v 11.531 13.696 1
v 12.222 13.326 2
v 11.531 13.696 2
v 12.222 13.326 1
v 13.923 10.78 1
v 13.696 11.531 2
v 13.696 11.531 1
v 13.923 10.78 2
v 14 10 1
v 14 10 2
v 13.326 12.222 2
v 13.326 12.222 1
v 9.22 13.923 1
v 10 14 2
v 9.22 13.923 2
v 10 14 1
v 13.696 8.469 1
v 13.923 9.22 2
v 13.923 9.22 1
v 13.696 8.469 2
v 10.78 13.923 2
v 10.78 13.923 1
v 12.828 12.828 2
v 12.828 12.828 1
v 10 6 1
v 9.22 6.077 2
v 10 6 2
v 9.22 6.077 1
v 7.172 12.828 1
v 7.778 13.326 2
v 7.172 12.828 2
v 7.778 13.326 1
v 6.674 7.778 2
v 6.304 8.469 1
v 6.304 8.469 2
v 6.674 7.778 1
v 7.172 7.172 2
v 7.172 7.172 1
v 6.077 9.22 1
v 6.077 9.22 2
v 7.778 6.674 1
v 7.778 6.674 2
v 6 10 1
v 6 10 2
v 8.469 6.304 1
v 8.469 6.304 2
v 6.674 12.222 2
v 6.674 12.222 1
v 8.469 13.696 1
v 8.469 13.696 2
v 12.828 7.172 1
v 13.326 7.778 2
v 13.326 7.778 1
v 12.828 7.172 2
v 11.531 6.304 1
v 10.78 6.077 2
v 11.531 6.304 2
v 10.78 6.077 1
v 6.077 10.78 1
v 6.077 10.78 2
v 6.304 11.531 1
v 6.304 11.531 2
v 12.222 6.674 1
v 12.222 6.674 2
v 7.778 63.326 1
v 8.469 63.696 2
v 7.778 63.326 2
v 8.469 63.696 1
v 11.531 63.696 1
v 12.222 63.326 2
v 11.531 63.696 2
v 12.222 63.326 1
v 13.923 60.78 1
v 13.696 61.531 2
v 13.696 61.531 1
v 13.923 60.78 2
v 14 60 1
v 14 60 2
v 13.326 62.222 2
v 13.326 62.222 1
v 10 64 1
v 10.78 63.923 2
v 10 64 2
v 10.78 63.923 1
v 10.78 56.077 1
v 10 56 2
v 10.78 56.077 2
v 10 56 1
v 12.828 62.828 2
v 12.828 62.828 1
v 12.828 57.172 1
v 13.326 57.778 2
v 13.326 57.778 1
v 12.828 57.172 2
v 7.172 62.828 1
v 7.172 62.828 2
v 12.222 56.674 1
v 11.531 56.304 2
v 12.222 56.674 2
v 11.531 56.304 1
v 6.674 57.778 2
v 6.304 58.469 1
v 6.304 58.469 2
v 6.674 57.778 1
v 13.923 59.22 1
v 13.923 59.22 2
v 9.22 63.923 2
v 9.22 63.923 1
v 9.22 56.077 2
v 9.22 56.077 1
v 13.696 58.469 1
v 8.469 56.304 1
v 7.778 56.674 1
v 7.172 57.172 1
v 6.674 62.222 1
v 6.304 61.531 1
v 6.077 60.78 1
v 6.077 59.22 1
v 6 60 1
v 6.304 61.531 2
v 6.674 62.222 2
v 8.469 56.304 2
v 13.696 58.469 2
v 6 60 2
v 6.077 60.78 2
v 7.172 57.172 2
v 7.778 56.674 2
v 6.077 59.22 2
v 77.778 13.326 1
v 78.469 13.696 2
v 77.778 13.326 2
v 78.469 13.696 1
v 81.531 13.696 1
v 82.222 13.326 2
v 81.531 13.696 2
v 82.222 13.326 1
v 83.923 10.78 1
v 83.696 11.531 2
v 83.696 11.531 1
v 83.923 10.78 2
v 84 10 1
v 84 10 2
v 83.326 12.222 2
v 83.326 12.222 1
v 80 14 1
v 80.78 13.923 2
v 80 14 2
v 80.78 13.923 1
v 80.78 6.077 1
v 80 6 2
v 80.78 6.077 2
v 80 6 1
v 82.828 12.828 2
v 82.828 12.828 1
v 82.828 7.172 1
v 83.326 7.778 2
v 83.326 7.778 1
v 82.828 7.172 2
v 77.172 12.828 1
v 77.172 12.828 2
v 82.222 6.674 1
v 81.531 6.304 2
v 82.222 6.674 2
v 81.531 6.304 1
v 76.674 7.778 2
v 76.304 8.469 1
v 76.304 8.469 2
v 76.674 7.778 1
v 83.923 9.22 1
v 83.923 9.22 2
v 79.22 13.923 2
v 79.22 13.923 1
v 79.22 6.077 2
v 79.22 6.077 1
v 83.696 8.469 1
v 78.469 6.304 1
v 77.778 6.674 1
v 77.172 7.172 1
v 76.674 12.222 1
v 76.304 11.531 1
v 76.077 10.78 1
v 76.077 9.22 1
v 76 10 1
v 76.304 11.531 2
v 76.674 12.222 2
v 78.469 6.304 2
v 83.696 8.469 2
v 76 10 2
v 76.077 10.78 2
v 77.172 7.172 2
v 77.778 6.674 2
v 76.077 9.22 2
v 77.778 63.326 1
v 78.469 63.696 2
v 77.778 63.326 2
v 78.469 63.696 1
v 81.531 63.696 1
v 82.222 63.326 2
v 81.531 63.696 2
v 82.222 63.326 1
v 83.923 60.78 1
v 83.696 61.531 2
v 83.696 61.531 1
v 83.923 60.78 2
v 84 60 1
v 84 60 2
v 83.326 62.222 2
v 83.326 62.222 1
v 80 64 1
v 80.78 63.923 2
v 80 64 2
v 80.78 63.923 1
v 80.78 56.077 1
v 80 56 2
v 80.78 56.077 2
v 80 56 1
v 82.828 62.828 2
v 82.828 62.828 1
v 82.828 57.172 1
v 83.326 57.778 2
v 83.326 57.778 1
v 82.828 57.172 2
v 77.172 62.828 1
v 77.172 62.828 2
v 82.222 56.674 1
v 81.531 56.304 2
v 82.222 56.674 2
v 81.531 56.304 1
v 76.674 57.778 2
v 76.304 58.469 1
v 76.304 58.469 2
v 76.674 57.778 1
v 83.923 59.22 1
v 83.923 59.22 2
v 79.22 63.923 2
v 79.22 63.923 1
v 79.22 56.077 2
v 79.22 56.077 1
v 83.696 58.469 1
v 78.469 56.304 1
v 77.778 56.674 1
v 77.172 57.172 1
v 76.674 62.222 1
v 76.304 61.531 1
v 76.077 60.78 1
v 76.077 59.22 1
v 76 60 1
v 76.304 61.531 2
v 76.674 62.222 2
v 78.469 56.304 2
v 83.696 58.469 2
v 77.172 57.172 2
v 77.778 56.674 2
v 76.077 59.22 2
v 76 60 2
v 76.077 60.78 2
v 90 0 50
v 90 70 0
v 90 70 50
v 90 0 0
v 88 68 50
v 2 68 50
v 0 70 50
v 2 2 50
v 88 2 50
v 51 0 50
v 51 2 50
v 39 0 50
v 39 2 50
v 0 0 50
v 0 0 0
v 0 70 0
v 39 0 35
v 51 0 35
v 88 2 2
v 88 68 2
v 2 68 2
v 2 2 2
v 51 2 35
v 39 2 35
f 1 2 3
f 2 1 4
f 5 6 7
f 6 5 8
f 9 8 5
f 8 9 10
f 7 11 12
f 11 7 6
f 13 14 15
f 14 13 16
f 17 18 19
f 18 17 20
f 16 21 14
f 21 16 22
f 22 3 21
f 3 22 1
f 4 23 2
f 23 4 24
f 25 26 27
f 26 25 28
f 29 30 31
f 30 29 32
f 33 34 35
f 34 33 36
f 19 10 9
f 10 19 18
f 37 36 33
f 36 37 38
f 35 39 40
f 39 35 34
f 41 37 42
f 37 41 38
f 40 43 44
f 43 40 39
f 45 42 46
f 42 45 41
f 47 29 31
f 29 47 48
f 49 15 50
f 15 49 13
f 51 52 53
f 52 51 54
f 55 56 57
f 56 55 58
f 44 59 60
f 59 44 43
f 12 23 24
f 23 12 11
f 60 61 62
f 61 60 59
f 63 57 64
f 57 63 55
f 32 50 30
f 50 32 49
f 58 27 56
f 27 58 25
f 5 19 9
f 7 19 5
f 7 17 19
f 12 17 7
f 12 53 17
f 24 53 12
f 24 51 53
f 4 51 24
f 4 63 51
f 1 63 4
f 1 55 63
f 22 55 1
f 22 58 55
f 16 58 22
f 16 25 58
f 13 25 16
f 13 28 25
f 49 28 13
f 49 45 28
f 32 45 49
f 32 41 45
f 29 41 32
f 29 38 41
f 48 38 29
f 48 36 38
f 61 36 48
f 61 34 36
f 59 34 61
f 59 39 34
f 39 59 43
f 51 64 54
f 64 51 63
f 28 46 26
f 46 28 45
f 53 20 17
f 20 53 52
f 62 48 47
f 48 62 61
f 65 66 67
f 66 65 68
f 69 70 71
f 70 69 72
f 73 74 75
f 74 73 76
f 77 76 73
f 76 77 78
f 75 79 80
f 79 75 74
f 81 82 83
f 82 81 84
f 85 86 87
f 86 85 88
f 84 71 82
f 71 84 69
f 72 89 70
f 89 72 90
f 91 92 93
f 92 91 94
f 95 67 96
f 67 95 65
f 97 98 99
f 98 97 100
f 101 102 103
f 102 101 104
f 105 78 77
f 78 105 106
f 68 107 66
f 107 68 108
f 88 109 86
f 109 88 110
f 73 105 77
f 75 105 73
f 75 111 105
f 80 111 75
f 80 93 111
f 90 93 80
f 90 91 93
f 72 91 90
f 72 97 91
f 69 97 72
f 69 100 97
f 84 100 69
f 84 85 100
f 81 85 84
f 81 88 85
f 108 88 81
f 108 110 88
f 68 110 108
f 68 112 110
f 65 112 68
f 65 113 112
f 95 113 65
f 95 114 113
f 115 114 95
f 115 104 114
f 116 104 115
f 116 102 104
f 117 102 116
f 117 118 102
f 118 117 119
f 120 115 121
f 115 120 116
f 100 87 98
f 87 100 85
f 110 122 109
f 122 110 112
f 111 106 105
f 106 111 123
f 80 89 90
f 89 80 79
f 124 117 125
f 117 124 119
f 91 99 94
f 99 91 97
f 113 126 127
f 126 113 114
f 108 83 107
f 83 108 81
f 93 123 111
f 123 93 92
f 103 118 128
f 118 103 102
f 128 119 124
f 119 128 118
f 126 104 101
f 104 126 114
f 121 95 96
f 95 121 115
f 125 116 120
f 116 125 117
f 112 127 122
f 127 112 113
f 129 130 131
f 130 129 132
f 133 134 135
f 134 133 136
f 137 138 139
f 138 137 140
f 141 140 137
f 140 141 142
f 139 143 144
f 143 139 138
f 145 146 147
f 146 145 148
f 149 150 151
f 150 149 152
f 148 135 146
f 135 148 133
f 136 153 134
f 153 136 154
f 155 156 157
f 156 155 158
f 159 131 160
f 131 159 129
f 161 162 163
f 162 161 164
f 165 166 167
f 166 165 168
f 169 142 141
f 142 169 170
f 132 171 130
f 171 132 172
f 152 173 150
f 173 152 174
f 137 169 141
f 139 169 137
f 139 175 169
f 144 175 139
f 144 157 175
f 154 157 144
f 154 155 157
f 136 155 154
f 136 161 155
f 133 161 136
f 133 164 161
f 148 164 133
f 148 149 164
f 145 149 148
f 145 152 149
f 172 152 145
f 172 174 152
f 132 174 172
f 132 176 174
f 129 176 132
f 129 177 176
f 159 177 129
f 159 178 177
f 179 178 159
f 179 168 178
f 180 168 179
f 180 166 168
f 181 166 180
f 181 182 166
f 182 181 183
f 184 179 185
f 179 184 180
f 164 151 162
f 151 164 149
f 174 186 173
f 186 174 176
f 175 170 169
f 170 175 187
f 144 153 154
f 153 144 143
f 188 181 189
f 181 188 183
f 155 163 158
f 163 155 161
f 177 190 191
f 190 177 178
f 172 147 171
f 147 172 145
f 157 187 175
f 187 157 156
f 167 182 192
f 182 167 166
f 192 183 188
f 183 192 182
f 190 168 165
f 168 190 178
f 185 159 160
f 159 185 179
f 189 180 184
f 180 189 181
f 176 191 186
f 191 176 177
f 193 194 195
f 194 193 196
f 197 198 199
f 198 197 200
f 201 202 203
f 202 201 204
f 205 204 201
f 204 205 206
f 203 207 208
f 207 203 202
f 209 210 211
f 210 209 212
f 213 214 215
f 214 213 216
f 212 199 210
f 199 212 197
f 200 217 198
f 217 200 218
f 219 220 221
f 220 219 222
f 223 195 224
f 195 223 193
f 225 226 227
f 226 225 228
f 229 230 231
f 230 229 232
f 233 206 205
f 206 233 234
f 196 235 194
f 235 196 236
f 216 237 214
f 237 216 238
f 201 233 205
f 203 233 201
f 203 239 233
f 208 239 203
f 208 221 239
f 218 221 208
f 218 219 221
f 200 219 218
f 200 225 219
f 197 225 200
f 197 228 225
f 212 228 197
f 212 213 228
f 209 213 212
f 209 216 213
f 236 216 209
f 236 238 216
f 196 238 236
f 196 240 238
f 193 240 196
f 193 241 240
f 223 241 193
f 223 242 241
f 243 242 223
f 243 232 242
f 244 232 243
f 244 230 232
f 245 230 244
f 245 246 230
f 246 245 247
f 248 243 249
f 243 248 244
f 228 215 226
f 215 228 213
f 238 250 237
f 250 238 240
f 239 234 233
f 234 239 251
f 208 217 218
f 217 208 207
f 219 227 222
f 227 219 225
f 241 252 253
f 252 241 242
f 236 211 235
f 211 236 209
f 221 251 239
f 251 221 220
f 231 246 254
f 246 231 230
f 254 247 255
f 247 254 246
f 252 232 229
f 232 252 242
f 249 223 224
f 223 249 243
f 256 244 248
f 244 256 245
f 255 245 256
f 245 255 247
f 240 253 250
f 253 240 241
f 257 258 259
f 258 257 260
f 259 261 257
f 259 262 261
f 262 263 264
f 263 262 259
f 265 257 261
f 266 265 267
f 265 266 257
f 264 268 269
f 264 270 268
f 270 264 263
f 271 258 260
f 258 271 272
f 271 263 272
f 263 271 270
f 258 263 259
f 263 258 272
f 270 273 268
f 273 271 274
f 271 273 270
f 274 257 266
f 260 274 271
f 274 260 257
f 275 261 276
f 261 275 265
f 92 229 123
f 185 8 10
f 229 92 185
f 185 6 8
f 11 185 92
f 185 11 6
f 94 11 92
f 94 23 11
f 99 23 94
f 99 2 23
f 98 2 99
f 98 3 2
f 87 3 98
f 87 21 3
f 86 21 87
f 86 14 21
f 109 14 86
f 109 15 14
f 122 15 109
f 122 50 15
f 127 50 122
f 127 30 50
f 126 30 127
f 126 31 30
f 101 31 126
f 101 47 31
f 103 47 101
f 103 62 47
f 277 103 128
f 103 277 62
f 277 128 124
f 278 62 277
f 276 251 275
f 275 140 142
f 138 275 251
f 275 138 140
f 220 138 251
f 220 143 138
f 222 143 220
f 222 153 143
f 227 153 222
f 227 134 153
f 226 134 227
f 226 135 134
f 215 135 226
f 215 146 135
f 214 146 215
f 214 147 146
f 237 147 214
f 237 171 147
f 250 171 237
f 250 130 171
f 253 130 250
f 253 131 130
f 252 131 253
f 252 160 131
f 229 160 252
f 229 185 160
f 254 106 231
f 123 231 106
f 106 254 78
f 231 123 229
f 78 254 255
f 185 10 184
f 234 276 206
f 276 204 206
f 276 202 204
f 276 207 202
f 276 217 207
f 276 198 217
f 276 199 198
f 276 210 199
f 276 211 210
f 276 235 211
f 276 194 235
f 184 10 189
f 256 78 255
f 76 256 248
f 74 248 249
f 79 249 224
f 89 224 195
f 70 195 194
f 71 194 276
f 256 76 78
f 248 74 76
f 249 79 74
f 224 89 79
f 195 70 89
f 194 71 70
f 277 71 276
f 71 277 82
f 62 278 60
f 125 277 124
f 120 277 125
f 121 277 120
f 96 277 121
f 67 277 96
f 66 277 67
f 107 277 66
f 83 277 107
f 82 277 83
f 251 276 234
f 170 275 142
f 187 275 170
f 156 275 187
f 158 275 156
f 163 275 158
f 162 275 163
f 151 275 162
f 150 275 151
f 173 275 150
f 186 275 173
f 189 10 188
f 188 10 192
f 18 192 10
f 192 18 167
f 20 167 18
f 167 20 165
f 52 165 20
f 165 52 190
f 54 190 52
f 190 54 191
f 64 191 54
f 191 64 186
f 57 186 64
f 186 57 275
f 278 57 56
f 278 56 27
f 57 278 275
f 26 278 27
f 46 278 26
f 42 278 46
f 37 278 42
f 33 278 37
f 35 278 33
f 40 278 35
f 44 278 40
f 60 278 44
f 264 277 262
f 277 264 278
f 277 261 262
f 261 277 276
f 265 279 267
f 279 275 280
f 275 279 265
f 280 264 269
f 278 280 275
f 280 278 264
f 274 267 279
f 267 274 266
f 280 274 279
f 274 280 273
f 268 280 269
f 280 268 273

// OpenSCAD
$fn = 32;

// ----------------------------------------------------------------------
// Enclosure box: both enclosure
// ----------------------------------------------------------------------

// --- parameters (mm) ---
box_l = 90;               // outer length, X
box_w = 70;               // outer width, Y
box_h = 50;               // outer height
wall_t = 2;               // wall thickness
boss_r = 4;               // corner boss radius
hole_r = 1.5;             // boss screw hole radius
boss_in = 10;             // boss inset from the corners
notch_w = 12;             // cable notch width
notch_h = 15;             // cable notch height

inner_h = box_h - wall_t;  // cavity depth
boss_h = inner_h - 2;  // corner boss height

difference() {
  cube([box_l, box_w, box_h]);
  translate([wall_t, wall_t, wall_t])
    cube([box_l - 2 * wall_t, box_w - 2 * wall_t, box_h]);
  for (sx = [0, 1], sy = [0, 1])
    translate([sx ? box_l - boss_in : boss_in,
               sy ? box_w - boss_in : boss_in, wall_t - 1]) {
      cylinder(r = boss_r, h = boss_h);
      translate([0, 0, boss_h - 4])
        cylinder(r = hole_r, h = 5);
    }
  translate([box_l / 2 - notch_w / 2, -1, box_h - notch_h])
    cube([notch_w, wall_t + 2, notch_h + 1]);
}
